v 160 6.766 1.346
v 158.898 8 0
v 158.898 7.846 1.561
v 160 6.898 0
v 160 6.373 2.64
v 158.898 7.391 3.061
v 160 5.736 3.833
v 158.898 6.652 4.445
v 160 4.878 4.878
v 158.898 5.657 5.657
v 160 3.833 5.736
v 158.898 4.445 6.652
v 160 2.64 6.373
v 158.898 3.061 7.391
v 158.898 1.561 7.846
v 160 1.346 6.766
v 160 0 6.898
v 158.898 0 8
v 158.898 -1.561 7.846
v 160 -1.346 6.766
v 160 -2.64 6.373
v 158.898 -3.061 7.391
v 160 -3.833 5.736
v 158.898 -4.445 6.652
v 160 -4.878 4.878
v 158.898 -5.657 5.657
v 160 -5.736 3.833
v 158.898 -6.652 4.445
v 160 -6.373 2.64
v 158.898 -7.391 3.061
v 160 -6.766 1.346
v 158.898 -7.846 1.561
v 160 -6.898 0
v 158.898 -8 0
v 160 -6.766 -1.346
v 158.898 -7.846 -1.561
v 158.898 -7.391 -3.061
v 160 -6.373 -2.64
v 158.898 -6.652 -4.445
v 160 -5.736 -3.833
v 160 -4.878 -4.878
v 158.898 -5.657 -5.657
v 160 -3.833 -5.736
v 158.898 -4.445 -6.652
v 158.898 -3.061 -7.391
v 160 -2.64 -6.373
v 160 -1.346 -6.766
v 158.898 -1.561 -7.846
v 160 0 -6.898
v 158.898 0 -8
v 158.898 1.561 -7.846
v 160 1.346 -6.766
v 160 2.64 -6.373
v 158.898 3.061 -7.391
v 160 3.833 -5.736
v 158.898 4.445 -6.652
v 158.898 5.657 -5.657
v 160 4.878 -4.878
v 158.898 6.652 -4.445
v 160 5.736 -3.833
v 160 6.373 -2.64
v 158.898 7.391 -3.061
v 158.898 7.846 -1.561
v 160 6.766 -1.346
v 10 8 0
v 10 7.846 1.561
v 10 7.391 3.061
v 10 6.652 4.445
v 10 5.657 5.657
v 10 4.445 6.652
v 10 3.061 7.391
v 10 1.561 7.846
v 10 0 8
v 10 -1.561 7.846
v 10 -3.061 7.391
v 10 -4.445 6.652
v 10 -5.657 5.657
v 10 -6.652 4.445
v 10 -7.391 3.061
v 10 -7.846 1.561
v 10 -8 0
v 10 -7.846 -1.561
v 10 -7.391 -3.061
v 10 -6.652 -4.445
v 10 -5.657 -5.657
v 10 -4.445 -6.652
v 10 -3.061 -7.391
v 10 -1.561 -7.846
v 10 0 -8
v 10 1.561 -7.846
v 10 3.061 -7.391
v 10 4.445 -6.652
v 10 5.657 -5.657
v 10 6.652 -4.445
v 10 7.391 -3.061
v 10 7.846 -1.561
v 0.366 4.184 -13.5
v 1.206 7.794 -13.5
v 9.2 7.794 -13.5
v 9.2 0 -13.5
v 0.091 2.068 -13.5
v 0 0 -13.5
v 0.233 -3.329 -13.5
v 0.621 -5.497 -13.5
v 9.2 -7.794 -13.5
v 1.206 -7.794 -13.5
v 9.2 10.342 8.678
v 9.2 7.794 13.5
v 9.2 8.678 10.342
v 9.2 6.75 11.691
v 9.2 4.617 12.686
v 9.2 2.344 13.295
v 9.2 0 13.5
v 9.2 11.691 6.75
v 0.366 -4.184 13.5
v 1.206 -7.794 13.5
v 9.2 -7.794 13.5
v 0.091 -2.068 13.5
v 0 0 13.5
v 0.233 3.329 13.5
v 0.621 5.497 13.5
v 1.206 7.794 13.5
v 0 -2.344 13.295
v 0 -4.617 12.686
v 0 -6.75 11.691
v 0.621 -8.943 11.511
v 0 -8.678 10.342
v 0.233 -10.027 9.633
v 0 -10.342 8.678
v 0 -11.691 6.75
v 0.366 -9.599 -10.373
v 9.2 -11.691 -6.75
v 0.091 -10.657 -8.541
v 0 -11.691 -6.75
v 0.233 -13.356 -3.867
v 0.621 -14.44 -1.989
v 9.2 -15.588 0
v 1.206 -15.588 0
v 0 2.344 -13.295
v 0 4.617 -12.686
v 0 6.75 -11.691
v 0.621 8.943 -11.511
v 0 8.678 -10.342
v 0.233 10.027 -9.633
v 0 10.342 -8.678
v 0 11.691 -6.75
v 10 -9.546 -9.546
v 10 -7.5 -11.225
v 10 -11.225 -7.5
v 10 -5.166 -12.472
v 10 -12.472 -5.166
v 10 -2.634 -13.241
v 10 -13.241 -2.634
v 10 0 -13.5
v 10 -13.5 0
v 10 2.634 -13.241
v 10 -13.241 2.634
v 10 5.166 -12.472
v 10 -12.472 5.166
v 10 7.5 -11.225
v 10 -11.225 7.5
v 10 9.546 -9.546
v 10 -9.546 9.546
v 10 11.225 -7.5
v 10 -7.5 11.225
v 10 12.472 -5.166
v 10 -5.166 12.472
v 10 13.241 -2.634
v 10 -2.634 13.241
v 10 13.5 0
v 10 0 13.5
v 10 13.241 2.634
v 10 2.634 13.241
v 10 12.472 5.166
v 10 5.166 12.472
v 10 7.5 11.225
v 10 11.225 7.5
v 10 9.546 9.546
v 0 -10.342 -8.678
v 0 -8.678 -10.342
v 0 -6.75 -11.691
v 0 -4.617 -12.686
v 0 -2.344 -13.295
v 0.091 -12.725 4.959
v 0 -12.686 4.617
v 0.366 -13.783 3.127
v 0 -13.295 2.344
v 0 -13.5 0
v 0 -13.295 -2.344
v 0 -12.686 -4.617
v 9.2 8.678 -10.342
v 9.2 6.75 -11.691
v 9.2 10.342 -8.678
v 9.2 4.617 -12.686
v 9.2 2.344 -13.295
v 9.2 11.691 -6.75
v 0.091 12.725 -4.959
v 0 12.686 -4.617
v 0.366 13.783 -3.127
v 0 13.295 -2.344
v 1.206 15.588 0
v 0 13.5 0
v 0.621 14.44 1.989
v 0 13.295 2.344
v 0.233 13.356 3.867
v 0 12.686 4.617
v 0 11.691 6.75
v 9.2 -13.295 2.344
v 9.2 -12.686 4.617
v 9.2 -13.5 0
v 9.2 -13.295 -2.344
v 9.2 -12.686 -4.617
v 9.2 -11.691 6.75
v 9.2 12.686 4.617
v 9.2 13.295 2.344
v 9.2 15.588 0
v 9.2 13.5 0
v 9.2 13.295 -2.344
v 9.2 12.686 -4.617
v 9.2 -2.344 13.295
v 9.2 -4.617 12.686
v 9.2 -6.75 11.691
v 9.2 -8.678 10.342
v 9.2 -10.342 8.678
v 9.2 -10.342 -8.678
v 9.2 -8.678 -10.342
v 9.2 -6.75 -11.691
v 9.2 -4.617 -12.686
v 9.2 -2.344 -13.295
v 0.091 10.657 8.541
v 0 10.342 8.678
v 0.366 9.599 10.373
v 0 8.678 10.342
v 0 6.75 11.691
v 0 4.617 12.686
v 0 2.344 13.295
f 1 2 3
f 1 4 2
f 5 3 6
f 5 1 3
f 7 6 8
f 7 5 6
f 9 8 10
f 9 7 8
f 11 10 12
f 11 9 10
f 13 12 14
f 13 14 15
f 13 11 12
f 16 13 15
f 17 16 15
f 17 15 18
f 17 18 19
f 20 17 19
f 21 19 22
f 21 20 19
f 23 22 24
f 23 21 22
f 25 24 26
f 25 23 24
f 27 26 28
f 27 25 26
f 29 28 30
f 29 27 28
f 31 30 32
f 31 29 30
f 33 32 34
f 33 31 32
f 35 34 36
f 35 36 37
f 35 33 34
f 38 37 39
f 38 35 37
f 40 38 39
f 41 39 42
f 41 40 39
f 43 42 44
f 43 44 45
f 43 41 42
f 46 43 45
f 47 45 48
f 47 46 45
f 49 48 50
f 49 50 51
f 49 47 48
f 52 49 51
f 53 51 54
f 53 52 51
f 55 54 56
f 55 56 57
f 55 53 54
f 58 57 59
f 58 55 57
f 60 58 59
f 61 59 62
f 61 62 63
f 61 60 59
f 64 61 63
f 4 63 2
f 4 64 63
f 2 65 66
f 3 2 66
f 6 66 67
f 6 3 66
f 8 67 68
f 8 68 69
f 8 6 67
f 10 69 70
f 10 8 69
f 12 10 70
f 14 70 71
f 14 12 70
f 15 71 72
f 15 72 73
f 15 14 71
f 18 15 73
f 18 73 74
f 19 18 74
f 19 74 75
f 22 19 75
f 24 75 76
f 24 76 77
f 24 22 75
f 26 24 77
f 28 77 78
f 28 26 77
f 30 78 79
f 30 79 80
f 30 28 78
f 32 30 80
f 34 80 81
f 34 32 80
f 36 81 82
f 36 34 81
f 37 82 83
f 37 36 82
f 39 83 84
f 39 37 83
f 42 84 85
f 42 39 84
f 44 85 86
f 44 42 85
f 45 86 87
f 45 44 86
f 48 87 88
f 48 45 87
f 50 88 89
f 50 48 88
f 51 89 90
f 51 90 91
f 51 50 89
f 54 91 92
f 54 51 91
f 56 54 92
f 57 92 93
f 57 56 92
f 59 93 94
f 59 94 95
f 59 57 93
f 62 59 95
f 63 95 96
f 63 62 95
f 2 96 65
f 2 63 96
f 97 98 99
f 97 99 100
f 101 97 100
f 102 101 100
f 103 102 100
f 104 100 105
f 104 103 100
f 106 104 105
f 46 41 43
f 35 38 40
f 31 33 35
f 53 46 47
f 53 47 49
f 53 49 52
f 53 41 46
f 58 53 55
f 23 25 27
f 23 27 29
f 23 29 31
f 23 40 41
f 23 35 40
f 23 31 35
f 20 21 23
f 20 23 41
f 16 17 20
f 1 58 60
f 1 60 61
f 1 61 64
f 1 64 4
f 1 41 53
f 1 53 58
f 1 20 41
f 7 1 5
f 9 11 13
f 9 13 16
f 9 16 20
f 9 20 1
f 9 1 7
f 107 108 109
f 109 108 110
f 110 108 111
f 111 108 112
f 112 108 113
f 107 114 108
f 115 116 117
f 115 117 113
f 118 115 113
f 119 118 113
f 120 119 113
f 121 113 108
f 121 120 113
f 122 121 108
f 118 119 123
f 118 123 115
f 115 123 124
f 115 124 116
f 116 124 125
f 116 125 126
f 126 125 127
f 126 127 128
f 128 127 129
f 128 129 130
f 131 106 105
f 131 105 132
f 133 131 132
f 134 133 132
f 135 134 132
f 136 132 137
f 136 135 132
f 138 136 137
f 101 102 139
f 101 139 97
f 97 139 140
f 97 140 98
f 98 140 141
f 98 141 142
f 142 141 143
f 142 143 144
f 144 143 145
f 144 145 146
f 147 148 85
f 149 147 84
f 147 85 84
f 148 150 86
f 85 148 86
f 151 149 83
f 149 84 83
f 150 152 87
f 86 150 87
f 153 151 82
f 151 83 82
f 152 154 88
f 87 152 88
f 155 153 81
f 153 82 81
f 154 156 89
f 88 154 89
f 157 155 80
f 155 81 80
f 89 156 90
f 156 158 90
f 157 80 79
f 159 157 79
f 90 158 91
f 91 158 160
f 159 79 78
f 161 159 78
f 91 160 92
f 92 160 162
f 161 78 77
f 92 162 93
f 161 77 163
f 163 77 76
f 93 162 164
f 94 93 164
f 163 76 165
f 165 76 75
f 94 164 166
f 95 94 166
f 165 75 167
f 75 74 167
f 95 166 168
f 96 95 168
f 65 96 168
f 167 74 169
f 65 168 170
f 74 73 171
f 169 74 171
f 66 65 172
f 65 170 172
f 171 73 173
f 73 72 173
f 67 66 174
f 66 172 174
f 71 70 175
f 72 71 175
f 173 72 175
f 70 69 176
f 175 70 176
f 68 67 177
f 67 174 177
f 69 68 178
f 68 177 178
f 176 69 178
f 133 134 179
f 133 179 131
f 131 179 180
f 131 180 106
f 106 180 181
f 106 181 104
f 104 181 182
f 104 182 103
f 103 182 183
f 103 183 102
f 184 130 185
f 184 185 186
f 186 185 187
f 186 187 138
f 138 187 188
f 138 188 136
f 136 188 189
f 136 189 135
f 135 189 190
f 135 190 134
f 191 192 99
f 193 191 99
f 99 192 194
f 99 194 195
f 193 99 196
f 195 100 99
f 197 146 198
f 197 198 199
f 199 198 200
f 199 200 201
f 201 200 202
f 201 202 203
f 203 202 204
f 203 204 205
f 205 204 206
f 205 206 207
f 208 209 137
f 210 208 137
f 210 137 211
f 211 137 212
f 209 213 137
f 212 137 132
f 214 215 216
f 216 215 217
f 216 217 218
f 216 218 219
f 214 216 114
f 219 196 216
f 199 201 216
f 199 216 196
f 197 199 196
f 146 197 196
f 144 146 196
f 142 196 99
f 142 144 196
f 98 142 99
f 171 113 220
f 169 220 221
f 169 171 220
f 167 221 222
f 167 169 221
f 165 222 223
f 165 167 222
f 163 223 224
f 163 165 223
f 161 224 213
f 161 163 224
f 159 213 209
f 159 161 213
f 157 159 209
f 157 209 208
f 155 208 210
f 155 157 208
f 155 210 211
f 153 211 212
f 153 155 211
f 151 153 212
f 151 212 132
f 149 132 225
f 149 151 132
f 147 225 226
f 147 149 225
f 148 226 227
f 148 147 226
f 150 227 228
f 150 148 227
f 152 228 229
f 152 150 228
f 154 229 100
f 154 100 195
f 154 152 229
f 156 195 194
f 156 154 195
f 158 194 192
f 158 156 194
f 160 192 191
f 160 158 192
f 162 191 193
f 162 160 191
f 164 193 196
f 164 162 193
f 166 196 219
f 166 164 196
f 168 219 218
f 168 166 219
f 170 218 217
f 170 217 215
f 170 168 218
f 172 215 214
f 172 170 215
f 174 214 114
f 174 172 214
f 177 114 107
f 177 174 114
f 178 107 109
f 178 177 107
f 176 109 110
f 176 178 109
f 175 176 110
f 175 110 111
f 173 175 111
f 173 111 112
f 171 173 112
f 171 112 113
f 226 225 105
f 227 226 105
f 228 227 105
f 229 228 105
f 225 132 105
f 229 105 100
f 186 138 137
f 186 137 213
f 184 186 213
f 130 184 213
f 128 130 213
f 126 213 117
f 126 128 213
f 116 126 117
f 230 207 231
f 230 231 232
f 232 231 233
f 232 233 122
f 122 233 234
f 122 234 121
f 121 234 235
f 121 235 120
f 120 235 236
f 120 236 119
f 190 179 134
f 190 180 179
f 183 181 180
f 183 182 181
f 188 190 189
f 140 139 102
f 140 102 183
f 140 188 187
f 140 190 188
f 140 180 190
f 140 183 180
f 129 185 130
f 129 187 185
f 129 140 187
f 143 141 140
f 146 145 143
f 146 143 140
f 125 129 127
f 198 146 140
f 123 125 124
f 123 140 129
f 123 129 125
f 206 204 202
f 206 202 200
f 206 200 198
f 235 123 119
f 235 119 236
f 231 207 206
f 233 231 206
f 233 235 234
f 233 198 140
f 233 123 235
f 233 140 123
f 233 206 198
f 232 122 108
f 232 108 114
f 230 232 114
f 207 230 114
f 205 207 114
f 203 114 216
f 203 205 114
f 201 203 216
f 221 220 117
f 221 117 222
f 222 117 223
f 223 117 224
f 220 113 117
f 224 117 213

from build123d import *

# Parameters (mm, degrees)
BASEHEAD_DEPTH = 10
SKETCH4_W      = 0.8
SKETCH4_H      = 12.088457268


# Read off the part's stored shape, not the designer's step: HeadChamfer
with BuildPart() as part:
    # Sketch1 → BaseHead (new body)
    with BuildSketch(Plane(origin=(0, 0, 0), x_dir=(0, 0, -1), z_dir=(1, 0, 0))):
        Polygon((13.5, 7.794228634), (13.5, -7.794228634), (0, -15.588457268), (-13.5, -7.794228634), (-13.5, 7.794228634), (0, 15.588457268), align=None)
    extrude(amount=BASEHEAD_DEPTH)

    # HeadChamfer outline → HeadChamfer (revolve, cut)
    with BuildSketch(Plane.YX):
        Polygon((15.58845727, 1.205771367), (13.499999851, -8.6e-08), (15.58845727, -8.6e-08), align=None)
    revolve(axis=Axis((0, 0, 0), (1, 0, 0)), mode=Mode.SUBTRACT)

    # HeadChamfer 2 outline → HeadChamfer 2 (revolve)
    with BuildSketch(Plane.YX):
        Polygon((8, 10), (8, 158.8985), (6.8985, 160), (0, 160), (0, 10), align=None)
    revolve(axis=Axis((0, 0, 0), (1, 0, 0)))

    # Sketch4 → BearingFace (revolve, cut)
    with BuildSketch(Plane.XY, mode=Mode.PRIVATE) as bearingface_sk:
        with Locations((9.6, 19.544228634)):
            Rectangle(SKETCH4_W, SKETCH4_H)
    revolve(bearingface_sk.sketch.rotate(Axis((0, 0, 0), (1, 0, 0)), 90), axis=Axis((0, 0, 0), (1, 0, 0)), mode=Mode.SUBTRACT)


solid = part.part
